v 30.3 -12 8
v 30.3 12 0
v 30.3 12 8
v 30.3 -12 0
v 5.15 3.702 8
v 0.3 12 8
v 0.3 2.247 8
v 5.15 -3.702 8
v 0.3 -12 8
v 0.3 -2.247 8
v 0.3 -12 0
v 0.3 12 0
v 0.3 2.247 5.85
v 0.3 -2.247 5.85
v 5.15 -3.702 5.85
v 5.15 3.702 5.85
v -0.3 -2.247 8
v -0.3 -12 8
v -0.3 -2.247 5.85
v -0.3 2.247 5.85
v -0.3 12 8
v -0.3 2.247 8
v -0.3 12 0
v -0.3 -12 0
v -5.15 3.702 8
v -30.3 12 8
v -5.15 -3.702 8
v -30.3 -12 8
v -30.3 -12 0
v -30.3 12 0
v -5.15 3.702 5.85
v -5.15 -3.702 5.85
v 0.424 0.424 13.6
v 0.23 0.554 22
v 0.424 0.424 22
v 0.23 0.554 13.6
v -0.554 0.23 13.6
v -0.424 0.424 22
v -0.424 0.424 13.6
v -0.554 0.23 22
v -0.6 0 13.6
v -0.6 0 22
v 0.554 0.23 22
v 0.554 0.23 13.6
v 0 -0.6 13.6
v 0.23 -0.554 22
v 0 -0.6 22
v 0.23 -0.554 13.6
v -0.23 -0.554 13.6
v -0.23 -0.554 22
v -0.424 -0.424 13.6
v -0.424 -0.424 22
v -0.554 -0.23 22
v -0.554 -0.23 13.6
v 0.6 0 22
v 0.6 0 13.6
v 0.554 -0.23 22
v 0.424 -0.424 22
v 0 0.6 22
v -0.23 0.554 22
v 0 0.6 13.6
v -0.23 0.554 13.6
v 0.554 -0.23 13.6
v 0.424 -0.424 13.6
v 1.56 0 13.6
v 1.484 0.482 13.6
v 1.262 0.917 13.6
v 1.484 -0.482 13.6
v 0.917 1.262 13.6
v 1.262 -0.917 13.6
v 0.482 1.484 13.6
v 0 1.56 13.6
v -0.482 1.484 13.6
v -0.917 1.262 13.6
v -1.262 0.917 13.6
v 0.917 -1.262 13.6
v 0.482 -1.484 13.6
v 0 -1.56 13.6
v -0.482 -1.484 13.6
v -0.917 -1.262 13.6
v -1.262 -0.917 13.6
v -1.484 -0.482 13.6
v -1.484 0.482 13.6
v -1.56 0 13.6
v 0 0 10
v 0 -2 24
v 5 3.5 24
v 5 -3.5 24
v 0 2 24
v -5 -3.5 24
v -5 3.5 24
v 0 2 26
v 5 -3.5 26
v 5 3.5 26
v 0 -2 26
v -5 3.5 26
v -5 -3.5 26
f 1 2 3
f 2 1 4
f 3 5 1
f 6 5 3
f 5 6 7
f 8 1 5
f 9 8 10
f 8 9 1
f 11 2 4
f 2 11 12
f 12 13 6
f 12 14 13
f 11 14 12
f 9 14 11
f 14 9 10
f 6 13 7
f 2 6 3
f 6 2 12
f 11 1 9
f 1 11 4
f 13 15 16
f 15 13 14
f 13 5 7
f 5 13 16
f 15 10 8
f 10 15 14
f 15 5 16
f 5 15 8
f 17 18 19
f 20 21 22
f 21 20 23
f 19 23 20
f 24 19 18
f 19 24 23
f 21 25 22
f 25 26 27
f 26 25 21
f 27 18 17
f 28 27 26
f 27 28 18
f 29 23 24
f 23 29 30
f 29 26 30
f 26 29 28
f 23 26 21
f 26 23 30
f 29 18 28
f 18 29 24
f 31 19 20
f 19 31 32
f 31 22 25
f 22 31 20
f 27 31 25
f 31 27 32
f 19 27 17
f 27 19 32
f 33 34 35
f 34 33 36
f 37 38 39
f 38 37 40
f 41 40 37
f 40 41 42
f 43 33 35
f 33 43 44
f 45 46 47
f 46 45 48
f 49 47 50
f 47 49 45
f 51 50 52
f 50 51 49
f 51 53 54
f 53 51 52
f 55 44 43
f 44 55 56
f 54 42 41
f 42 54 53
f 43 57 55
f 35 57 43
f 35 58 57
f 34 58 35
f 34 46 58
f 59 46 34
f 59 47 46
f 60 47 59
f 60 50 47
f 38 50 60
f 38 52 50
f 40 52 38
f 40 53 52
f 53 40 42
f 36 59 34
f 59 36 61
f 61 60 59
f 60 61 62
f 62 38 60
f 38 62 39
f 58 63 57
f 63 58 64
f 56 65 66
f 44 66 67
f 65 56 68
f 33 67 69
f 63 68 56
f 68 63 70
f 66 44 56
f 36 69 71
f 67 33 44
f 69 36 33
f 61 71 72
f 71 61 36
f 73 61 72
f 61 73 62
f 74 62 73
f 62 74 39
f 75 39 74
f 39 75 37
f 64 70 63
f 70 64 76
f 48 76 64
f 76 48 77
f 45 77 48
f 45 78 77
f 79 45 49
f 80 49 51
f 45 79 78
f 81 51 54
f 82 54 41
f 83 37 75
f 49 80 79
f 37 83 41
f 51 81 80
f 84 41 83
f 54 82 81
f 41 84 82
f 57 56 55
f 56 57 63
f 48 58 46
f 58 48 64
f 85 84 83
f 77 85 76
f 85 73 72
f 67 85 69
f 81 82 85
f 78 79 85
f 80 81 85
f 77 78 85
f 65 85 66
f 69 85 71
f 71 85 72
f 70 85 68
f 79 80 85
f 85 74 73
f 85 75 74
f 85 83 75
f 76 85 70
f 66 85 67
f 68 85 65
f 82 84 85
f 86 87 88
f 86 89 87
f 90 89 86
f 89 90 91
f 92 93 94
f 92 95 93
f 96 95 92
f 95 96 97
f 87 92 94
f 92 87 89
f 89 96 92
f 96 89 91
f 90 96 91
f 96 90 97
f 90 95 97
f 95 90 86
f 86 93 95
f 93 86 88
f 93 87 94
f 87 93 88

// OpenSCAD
// file: anl_common.scad
// gemeinsame Hilfen für die Anleitungsbilder
module pfeil(p, q, d = 2) {
    v = q - p; L = norm(v);
    if (L > 0.01) color("#e2231a") translate(p) {
        b = acos(v[2] / L); c = atan2(v[1], v[0]);
        rotate([0, b, c]) { cylinder(d = d, h = max(0.01, L - 3 * d), $fn = 16); translate([0, 0, L - 3 * d]) cylinder(d1 = 2.6 * d, d2 = 0, h = 3 * d, $fn = 20); }
    }
}
// Teil im Schritt verschieben (ex = 0/1) und Pfeil von der verschobenen Lage zur Endlage
module rein(v, ex, a = [0, 0, 0], d = 2) {
    translate(ex * v) children();
    if (ex > 0) pfeil(a + v * 0.85, a + v * 0.2, d);
}
// main file
include <anl_common.scad>
cL = 10; cw0 = 4; cw1 = 7; ch = 2; sp = 0.15;
module bow(o = 0) offset(delta = o) polygon([[-cL / 2, -cw1 / 2], [0, -cw0 / 2], [cL / 2, -cw1 / 2], [cL / 2, cw1 / 2], [0, cw0 / 2], [-cL / 2, cw1 / 2]]);
module block(s) color("#aaa69d") difference() {
    translate([s > 0 ? 0.3 : -30.3, -12, 0]) cube([30, 24, 8]);
    translate([0, 0, 8 - ch - sp]) linear_extrude(ch + sp + 1) bow(sp);
}
block(1); block(-1);
color("#3c78c8") translate([0, 0, 24]) linear_extrude(ch) bow();
pfeil([0, 0, 22], [0, 0, 10], 1.2);
